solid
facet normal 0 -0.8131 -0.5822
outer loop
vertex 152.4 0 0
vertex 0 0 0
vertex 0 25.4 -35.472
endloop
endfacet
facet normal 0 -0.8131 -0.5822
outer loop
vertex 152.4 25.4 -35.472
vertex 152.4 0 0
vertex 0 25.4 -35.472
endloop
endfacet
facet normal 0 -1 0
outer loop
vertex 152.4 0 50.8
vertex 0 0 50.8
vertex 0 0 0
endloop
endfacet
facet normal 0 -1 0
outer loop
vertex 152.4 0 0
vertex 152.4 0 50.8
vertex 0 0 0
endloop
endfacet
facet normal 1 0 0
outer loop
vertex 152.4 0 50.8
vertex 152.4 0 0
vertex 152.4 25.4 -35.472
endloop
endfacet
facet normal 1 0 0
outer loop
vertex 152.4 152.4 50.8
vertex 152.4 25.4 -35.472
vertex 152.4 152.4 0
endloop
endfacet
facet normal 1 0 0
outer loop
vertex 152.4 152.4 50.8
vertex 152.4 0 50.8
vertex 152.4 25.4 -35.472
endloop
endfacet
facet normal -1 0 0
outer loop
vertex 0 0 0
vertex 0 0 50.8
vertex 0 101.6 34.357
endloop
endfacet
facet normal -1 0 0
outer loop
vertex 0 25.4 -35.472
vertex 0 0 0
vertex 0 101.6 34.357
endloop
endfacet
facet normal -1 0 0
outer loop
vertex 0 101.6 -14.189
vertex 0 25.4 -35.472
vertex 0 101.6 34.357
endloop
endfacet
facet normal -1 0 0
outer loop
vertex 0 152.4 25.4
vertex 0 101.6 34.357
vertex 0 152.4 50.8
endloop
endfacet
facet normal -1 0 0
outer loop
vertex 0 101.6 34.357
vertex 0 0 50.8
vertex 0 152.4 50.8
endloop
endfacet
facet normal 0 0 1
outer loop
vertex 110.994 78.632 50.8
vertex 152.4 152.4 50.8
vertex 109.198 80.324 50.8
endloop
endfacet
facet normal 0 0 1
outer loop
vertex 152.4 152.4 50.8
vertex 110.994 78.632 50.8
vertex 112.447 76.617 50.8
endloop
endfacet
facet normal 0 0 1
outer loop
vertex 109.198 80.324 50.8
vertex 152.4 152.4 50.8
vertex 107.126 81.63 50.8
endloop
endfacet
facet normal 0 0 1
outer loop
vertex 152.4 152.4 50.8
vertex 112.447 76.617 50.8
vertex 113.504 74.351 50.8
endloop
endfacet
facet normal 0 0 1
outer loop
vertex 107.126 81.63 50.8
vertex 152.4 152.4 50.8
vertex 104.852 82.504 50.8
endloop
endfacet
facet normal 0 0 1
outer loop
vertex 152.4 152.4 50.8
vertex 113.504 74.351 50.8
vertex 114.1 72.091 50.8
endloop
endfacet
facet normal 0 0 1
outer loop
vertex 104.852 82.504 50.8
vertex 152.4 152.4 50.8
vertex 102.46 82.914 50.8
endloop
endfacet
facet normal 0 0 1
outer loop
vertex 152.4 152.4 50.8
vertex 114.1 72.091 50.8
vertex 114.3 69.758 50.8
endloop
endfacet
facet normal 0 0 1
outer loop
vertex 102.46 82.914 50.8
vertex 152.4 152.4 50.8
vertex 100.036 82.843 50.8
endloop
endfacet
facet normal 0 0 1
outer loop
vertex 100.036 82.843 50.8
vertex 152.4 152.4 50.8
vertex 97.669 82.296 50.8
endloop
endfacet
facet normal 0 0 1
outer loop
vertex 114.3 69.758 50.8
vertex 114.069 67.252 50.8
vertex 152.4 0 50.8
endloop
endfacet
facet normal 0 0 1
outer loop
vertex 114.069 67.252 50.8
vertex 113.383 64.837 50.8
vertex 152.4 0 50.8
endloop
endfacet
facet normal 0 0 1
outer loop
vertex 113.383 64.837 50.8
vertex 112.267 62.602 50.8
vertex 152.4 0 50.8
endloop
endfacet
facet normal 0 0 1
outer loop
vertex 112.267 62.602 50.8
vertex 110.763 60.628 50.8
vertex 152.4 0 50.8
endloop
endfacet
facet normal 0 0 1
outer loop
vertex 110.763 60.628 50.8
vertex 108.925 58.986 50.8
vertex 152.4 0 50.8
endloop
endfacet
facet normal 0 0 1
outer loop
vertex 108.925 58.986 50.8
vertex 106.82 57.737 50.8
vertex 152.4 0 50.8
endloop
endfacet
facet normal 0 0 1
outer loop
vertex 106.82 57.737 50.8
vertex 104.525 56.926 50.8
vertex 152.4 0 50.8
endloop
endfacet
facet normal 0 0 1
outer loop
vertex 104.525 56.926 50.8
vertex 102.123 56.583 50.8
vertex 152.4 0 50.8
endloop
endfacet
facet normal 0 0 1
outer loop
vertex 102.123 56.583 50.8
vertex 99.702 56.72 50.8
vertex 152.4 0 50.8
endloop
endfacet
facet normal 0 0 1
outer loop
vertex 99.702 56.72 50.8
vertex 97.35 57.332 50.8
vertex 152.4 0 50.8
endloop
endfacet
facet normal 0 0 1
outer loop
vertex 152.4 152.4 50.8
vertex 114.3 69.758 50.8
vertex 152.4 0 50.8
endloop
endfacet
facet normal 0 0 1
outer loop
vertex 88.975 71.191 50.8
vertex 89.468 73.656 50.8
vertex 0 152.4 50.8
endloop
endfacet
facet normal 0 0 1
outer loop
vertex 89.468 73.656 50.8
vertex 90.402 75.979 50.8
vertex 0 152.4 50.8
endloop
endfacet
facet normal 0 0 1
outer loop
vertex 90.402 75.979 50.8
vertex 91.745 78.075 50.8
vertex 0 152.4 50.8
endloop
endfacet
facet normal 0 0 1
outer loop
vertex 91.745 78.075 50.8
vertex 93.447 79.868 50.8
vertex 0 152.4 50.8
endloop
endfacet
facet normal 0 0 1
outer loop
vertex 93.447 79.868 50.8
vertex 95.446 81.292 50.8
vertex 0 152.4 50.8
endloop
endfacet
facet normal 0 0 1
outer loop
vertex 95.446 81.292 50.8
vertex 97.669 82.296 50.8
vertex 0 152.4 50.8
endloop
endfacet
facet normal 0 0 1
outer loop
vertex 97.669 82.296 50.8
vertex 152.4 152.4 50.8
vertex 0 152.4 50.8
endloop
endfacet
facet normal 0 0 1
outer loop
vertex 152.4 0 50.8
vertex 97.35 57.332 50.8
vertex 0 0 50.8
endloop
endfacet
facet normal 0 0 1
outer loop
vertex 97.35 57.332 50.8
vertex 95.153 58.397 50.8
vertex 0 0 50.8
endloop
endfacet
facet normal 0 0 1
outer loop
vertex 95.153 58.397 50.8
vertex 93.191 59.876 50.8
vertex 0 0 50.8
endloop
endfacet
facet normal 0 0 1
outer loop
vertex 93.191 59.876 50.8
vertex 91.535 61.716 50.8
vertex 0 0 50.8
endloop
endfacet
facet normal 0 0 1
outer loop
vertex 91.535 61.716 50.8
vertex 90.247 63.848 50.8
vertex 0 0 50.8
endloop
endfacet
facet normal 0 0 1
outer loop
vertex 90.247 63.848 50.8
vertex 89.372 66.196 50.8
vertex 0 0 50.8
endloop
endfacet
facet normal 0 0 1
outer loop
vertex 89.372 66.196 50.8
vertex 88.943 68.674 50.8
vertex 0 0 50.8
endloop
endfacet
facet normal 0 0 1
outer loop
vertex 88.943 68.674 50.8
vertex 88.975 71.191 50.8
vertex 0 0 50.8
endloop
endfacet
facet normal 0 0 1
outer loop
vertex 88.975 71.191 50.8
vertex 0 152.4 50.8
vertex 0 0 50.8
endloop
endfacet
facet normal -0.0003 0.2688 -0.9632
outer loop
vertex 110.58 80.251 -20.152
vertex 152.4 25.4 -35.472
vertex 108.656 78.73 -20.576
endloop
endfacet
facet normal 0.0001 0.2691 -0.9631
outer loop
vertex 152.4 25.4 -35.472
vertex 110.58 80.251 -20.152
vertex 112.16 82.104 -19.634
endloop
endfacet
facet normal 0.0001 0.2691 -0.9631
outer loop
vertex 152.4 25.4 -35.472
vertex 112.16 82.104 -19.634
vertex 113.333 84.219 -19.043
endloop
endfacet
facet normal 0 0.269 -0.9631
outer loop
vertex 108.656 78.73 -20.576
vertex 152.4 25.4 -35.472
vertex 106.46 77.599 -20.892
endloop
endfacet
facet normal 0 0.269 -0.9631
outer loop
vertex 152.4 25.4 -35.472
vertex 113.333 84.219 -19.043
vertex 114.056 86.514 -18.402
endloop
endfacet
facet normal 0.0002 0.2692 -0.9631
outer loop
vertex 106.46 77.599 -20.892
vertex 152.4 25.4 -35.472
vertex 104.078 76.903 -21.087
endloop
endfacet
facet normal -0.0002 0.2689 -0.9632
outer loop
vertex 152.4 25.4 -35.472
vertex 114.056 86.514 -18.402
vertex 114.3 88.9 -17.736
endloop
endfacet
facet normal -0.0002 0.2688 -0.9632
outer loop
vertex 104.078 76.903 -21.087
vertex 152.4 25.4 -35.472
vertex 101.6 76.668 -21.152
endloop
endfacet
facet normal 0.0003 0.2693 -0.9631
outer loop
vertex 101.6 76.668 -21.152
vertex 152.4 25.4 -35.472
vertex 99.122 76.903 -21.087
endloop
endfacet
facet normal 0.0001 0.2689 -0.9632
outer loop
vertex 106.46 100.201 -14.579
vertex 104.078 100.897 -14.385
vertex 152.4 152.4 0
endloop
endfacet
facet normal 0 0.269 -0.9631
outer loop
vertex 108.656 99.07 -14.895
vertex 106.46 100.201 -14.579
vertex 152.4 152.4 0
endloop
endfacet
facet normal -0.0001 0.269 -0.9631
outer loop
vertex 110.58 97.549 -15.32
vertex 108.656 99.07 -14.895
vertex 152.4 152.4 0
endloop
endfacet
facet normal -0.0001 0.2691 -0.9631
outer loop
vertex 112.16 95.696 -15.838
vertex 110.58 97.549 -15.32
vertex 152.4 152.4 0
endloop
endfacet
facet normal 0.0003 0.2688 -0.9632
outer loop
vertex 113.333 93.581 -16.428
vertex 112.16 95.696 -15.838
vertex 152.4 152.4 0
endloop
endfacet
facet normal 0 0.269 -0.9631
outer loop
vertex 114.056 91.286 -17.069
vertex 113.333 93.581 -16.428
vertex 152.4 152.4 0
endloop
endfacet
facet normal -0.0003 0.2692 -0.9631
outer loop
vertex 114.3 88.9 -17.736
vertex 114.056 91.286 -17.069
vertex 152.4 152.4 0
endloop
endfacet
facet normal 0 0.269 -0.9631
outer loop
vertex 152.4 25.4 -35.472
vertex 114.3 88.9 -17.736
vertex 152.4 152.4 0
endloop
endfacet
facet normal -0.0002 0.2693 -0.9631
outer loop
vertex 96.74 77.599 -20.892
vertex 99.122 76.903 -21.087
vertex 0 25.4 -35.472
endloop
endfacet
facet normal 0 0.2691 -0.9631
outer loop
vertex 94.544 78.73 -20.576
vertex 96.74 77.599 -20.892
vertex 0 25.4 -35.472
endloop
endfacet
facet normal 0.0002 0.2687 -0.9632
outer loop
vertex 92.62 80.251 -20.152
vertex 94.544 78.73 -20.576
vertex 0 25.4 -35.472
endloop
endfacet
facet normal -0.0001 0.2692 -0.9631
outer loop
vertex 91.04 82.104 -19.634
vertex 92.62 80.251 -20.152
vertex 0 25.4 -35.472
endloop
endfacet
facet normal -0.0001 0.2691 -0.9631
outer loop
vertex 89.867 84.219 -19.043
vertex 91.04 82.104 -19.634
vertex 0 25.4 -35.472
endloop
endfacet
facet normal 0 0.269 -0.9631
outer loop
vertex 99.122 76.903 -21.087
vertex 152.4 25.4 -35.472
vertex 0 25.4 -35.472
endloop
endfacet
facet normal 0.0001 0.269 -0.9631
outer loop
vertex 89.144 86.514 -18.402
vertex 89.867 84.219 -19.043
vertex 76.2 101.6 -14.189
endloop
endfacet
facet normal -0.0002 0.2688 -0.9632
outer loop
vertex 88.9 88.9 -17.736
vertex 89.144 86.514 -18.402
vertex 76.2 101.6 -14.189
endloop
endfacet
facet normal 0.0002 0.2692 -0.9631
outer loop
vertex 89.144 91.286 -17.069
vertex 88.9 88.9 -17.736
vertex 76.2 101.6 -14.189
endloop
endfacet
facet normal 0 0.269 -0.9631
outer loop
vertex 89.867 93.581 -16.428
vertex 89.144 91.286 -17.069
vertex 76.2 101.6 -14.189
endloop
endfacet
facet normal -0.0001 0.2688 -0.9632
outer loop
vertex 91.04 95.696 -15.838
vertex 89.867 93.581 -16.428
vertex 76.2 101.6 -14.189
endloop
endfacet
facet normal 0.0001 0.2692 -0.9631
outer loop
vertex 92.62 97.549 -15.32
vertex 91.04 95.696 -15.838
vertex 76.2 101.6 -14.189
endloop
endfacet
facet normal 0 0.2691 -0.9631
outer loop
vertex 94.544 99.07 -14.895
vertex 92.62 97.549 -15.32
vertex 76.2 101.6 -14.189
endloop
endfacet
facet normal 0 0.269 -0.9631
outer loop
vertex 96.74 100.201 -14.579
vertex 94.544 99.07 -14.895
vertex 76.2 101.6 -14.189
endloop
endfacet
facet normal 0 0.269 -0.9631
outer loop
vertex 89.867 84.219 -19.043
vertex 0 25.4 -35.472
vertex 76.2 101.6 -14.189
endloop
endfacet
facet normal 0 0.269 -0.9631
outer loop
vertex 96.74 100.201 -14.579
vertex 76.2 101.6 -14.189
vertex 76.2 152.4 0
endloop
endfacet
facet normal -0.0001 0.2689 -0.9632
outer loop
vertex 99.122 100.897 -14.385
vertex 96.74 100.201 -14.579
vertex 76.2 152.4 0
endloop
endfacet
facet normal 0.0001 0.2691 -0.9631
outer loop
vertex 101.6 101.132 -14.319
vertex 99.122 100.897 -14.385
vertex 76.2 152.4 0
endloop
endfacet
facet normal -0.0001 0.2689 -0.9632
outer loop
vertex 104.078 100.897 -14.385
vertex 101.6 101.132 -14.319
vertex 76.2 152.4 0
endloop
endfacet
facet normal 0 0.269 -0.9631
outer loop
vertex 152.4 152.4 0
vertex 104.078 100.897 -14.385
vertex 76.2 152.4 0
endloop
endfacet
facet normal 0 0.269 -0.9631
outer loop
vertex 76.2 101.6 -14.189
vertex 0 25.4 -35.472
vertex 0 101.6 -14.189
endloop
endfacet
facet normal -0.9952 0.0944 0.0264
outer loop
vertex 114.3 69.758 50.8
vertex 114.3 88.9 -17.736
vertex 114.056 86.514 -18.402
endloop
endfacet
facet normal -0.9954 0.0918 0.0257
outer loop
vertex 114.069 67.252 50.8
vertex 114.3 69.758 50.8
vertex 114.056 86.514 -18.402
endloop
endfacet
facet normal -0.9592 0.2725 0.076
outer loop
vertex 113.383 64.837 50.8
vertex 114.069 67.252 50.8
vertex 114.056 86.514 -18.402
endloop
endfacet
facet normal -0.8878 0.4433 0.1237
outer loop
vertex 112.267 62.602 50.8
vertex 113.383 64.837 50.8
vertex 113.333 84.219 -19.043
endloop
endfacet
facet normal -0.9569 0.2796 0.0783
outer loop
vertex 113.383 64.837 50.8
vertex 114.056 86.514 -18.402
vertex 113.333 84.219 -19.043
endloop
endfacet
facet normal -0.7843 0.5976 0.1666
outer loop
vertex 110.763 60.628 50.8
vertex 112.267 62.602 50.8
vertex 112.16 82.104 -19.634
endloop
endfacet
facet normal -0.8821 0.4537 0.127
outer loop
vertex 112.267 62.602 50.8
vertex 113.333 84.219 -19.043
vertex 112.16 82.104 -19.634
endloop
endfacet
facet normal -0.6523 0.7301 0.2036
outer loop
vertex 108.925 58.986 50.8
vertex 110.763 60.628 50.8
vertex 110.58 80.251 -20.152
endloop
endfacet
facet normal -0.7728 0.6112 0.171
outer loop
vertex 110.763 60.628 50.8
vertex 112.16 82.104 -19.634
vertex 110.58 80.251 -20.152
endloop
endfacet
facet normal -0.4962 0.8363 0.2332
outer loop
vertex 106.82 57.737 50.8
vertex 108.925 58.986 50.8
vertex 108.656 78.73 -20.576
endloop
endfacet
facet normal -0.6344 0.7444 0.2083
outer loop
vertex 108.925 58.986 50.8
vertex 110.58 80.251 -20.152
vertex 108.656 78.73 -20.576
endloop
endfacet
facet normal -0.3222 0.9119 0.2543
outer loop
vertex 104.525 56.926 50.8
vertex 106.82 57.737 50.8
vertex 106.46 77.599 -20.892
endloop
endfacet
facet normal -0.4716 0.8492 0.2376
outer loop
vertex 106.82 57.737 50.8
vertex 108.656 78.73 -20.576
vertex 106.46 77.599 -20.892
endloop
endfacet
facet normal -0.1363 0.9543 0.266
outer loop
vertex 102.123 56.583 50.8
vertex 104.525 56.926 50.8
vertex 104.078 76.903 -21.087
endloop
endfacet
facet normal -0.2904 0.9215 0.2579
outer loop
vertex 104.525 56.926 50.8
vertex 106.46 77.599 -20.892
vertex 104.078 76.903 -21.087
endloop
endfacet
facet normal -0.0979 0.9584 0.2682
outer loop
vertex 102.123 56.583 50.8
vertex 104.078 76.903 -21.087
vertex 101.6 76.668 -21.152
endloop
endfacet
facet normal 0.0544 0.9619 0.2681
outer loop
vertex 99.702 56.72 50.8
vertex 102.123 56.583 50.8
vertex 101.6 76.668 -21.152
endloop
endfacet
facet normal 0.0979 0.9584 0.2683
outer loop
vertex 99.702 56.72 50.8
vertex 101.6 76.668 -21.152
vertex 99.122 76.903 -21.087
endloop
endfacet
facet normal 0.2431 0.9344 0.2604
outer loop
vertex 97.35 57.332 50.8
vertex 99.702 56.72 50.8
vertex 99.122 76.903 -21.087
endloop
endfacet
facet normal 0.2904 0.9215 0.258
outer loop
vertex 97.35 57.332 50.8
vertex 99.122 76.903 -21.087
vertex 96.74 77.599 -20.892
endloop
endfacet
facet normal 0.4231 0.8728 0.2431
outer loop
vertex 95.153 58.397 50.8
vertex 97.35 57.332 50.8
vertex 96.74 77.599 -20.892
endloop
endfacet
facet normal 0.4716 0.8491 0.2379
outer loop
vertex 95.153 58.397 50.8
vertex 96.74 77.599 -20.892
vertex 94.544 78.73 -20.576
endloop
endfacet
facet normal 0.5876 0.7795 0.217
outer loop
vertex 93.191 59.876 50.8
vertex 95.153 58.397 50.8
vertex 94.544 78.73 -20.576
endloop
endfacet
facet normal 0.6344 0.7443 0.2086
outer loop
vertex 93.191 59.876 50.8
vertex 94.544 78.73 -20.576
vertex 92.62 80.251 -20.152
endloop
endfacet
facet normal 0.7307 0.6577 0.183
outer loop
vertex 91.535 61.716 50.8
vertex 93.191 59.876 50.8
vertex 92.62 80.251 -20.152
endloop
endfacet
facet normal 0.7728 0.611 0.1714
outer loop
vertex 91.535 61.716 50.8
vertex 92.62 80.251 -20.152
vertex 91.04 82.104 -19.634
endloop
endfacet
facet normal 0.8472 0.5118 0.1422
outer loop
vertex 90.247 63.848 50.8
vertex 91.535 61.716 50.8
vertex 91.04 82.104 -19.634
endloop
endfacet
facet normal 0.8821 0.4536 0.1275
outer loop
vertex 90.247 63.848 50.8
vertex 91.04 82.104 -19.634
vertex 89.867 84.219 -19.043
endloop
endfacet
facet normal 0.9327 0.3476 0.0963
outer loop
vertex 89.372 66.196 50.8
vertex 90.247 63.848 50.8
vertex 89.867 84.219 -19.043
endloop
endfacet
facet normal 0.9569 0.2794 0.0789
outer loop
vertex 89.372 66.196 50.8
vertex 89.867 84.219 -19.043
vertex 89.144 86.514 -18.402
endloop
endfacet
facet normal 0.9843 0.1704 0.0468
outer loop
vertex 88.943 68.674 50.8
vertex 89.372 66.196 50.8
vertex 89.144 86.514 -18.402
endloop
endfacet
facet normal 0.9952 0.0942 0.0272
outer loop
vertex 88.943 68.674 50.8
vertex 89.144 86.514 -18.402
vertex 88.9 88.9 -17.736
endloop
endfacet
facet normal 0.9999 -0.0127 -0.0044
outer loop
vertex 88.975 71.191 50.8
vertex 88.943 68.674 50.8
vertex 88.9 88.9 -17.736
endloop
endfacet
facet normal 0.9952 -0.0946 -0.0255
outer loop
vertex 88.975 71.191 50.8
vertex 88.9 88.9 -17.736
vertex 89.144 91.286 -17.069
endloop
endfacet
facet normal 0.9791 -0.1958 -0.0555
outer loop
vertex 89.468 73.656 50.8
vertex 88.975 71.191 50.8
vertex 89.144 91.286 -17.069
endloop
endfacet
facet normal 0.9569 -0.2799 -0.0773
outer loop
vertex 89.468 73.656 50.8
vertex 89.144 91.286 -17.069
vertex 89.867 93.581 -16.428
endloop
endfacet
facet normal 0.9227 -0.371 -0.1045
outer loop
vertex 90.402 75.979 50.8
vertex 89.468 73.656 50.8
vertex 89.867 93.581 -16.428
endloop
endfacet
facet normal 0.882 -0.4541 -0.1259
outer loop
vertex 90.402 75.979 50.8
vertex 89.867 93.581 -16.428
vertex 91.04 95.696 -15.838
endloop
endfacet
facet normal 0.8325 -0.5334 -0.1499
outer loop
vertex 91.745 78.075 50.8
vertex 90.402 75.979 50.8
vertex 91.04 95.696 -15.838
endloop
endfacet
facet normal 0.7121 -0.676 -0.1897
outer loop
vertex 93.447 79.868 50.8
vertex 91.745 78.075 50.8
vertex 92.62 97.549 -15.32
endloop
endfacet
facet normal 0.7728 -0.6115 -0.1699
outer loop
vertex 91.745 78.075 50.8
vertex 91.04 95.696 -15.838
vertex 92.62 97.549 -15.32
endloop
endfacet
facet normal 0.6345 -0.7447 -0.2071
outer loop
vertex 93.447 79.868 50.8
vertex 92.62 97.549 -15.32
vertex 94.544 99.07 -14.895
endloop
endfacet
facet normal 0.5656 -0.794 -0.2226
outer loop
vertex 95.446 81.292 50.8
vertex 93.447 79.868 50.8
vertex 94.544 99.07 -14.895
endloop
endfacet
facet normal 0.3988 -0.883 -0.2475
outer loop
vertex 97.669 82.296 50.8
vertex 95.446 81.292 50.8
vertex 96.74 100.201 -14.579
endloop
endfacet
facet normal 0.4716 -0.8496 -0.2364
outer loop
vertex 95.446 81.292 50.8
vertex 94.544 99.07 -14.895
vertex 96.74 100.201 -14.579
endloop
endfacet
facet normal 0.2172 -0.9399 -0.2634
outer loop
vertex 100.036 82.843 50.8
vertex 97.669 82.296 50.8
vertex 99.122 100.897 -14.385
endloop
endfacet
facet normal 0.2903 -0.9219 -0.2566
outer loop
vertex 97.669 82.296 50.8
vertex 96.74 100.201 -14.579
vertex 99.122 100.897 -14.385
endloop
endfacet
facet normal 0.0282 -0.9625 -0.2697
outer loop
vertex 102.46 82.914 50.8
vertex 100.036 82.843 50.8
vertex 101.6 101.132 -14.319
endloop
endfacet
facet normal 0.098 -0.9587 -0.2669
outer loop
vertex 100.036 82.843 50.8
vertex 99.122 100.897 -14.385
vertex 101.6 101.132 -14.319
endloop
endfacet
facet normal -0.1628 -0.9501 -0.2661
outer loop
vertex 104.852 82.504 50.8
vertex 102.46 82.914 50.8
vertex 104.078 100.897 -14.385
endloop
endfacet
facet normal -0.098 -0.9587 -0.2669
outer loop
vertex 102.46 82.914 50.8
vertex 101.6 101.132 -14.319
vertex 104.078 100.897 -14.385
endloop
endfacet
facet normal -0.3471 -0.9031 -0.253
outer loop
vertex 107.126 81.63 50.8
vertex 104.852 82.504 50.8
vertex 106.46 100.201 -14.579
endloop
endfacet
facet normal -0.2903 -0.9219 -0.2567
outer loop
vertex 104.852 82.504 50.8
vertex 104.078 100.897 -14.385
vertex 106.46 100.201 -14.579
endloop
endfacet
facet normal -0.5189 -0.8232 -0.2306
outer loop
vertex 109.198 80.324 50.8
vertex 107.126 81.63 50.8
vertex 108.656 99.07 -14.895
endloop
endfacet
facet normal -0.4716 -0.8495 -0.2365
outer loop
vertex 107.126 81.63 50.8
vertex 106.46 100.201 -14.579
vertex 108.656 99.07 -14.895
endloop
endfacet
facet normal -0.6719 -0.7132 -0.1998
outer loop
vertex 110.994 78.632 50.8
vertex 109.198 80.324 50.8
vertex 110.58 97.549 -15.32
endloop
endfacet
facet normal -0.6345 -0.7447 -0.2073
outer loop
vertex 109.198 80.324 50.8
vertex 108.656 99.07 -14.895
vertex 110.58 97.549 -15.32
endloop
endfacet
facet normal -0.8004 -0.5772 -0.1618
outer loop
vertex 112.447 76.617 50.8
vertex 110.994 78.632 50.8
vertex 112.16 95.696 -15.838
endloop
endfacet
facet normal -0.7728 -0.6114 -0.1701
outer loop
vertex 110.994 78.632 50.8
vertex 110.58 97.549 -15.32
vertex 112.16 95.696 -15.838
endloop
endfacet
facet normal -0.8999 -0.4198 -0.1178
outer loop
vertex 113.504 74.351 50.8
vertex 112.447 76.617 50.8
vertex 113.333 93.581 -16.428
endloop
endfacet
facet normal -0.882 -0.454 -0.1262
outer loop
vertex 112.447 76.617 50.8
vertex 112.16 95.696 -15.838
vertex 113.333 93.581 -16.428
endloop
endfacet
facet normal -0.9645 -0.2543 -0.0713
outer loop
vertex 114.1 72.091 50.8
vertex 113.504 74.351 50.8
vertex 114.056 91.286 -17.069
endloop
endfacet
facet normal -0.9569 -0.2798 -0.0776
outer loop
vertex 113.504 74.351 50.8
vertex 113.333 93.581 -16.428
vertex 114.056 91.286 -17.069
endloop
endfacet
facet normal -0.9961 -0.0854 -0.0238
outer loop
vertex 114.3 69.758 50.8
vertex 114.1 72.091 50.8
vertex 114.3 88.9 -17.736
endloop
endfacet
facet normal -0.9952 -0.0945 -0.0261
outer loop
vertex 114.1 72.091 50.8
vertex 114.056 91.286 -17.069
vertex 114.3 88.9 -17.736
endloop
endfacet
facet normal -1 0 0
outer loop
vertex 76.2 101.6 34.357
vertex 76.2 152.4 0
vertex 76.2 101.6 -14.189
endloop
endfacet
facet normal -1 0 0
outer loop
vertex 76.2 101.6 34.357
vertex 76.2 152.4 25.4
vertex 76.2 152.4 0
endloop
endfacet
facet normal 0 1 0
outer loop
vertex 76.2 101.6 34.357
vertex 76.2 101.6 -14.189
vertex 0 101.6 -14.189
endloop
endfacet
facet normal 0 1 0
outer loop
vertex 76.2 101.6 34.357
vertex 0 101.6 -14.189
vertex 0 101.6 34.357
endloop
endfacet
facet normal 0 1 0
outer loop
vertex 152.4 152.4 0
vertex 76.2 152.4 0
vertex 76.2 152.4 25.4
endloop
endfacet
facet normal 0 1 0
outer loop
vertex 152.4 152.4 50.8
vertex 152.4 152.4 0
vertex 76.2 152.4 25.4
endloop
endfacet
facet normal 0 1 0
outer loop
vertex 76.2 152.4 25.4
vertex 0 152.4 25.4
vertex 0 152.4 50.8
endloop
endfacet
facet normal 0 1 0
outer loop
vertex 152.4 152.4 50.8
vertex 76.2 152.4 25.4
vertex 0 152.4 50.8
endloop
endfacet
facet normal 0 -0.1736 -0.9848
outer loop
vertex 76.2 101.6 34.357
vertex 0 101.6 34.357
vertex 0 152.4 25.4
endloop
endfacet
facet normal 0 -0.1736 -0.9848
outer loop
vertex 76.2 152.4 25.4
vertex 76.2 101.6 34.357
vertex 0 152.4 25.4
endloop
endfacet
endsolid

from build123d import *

# Parameters (mm, degrees)
F1_DEPTH = 152.4
F2_R     = 12.7
F3_DEPTH = 74.7069606938
F5_DEPTH = 76.2


with BuildPart() as f1:
    # F0 (on Right) → F1 (new body)
    with BuildSketch(Plane.YZ):
        Polygon((152.4, 50.8), (0, 50.8), (0, 0), (25.4, -35.4715141967), (152.4, 0), align=None)
    extrude(amount=F1_DEPTH)

    # F2 (on face) → F3 (cut, through all)
    with BuildSketch(Plane(origin=(0, 11.0284395164, -39.4855379111), x_dir=(1, 0, 0), z_dir=(0, 0.2690075997, -0.9631380541))):
        with Locations((101.6, -80.8519195663)):
            Circle(F2_R)
    extrude(amount=-F3_DEPTH, mode=Mode.SUBTRACT)

    # F4 (on face) → F5 (cut)
    with BuildSketch(Plane(origin=(0, 0, 0), x_dir=(0, -1, 0), z_dir=(-1, 0, 0))):
        Polygon((-152.4, 0), (-101.6, -14.1886056787), (-101.6, 34.35741062), (-152.4, 25.4), align=None)
    extrude(amount=-F5_DEPTH, mode=Mode.SUBTRACT)


solid = f1.part
